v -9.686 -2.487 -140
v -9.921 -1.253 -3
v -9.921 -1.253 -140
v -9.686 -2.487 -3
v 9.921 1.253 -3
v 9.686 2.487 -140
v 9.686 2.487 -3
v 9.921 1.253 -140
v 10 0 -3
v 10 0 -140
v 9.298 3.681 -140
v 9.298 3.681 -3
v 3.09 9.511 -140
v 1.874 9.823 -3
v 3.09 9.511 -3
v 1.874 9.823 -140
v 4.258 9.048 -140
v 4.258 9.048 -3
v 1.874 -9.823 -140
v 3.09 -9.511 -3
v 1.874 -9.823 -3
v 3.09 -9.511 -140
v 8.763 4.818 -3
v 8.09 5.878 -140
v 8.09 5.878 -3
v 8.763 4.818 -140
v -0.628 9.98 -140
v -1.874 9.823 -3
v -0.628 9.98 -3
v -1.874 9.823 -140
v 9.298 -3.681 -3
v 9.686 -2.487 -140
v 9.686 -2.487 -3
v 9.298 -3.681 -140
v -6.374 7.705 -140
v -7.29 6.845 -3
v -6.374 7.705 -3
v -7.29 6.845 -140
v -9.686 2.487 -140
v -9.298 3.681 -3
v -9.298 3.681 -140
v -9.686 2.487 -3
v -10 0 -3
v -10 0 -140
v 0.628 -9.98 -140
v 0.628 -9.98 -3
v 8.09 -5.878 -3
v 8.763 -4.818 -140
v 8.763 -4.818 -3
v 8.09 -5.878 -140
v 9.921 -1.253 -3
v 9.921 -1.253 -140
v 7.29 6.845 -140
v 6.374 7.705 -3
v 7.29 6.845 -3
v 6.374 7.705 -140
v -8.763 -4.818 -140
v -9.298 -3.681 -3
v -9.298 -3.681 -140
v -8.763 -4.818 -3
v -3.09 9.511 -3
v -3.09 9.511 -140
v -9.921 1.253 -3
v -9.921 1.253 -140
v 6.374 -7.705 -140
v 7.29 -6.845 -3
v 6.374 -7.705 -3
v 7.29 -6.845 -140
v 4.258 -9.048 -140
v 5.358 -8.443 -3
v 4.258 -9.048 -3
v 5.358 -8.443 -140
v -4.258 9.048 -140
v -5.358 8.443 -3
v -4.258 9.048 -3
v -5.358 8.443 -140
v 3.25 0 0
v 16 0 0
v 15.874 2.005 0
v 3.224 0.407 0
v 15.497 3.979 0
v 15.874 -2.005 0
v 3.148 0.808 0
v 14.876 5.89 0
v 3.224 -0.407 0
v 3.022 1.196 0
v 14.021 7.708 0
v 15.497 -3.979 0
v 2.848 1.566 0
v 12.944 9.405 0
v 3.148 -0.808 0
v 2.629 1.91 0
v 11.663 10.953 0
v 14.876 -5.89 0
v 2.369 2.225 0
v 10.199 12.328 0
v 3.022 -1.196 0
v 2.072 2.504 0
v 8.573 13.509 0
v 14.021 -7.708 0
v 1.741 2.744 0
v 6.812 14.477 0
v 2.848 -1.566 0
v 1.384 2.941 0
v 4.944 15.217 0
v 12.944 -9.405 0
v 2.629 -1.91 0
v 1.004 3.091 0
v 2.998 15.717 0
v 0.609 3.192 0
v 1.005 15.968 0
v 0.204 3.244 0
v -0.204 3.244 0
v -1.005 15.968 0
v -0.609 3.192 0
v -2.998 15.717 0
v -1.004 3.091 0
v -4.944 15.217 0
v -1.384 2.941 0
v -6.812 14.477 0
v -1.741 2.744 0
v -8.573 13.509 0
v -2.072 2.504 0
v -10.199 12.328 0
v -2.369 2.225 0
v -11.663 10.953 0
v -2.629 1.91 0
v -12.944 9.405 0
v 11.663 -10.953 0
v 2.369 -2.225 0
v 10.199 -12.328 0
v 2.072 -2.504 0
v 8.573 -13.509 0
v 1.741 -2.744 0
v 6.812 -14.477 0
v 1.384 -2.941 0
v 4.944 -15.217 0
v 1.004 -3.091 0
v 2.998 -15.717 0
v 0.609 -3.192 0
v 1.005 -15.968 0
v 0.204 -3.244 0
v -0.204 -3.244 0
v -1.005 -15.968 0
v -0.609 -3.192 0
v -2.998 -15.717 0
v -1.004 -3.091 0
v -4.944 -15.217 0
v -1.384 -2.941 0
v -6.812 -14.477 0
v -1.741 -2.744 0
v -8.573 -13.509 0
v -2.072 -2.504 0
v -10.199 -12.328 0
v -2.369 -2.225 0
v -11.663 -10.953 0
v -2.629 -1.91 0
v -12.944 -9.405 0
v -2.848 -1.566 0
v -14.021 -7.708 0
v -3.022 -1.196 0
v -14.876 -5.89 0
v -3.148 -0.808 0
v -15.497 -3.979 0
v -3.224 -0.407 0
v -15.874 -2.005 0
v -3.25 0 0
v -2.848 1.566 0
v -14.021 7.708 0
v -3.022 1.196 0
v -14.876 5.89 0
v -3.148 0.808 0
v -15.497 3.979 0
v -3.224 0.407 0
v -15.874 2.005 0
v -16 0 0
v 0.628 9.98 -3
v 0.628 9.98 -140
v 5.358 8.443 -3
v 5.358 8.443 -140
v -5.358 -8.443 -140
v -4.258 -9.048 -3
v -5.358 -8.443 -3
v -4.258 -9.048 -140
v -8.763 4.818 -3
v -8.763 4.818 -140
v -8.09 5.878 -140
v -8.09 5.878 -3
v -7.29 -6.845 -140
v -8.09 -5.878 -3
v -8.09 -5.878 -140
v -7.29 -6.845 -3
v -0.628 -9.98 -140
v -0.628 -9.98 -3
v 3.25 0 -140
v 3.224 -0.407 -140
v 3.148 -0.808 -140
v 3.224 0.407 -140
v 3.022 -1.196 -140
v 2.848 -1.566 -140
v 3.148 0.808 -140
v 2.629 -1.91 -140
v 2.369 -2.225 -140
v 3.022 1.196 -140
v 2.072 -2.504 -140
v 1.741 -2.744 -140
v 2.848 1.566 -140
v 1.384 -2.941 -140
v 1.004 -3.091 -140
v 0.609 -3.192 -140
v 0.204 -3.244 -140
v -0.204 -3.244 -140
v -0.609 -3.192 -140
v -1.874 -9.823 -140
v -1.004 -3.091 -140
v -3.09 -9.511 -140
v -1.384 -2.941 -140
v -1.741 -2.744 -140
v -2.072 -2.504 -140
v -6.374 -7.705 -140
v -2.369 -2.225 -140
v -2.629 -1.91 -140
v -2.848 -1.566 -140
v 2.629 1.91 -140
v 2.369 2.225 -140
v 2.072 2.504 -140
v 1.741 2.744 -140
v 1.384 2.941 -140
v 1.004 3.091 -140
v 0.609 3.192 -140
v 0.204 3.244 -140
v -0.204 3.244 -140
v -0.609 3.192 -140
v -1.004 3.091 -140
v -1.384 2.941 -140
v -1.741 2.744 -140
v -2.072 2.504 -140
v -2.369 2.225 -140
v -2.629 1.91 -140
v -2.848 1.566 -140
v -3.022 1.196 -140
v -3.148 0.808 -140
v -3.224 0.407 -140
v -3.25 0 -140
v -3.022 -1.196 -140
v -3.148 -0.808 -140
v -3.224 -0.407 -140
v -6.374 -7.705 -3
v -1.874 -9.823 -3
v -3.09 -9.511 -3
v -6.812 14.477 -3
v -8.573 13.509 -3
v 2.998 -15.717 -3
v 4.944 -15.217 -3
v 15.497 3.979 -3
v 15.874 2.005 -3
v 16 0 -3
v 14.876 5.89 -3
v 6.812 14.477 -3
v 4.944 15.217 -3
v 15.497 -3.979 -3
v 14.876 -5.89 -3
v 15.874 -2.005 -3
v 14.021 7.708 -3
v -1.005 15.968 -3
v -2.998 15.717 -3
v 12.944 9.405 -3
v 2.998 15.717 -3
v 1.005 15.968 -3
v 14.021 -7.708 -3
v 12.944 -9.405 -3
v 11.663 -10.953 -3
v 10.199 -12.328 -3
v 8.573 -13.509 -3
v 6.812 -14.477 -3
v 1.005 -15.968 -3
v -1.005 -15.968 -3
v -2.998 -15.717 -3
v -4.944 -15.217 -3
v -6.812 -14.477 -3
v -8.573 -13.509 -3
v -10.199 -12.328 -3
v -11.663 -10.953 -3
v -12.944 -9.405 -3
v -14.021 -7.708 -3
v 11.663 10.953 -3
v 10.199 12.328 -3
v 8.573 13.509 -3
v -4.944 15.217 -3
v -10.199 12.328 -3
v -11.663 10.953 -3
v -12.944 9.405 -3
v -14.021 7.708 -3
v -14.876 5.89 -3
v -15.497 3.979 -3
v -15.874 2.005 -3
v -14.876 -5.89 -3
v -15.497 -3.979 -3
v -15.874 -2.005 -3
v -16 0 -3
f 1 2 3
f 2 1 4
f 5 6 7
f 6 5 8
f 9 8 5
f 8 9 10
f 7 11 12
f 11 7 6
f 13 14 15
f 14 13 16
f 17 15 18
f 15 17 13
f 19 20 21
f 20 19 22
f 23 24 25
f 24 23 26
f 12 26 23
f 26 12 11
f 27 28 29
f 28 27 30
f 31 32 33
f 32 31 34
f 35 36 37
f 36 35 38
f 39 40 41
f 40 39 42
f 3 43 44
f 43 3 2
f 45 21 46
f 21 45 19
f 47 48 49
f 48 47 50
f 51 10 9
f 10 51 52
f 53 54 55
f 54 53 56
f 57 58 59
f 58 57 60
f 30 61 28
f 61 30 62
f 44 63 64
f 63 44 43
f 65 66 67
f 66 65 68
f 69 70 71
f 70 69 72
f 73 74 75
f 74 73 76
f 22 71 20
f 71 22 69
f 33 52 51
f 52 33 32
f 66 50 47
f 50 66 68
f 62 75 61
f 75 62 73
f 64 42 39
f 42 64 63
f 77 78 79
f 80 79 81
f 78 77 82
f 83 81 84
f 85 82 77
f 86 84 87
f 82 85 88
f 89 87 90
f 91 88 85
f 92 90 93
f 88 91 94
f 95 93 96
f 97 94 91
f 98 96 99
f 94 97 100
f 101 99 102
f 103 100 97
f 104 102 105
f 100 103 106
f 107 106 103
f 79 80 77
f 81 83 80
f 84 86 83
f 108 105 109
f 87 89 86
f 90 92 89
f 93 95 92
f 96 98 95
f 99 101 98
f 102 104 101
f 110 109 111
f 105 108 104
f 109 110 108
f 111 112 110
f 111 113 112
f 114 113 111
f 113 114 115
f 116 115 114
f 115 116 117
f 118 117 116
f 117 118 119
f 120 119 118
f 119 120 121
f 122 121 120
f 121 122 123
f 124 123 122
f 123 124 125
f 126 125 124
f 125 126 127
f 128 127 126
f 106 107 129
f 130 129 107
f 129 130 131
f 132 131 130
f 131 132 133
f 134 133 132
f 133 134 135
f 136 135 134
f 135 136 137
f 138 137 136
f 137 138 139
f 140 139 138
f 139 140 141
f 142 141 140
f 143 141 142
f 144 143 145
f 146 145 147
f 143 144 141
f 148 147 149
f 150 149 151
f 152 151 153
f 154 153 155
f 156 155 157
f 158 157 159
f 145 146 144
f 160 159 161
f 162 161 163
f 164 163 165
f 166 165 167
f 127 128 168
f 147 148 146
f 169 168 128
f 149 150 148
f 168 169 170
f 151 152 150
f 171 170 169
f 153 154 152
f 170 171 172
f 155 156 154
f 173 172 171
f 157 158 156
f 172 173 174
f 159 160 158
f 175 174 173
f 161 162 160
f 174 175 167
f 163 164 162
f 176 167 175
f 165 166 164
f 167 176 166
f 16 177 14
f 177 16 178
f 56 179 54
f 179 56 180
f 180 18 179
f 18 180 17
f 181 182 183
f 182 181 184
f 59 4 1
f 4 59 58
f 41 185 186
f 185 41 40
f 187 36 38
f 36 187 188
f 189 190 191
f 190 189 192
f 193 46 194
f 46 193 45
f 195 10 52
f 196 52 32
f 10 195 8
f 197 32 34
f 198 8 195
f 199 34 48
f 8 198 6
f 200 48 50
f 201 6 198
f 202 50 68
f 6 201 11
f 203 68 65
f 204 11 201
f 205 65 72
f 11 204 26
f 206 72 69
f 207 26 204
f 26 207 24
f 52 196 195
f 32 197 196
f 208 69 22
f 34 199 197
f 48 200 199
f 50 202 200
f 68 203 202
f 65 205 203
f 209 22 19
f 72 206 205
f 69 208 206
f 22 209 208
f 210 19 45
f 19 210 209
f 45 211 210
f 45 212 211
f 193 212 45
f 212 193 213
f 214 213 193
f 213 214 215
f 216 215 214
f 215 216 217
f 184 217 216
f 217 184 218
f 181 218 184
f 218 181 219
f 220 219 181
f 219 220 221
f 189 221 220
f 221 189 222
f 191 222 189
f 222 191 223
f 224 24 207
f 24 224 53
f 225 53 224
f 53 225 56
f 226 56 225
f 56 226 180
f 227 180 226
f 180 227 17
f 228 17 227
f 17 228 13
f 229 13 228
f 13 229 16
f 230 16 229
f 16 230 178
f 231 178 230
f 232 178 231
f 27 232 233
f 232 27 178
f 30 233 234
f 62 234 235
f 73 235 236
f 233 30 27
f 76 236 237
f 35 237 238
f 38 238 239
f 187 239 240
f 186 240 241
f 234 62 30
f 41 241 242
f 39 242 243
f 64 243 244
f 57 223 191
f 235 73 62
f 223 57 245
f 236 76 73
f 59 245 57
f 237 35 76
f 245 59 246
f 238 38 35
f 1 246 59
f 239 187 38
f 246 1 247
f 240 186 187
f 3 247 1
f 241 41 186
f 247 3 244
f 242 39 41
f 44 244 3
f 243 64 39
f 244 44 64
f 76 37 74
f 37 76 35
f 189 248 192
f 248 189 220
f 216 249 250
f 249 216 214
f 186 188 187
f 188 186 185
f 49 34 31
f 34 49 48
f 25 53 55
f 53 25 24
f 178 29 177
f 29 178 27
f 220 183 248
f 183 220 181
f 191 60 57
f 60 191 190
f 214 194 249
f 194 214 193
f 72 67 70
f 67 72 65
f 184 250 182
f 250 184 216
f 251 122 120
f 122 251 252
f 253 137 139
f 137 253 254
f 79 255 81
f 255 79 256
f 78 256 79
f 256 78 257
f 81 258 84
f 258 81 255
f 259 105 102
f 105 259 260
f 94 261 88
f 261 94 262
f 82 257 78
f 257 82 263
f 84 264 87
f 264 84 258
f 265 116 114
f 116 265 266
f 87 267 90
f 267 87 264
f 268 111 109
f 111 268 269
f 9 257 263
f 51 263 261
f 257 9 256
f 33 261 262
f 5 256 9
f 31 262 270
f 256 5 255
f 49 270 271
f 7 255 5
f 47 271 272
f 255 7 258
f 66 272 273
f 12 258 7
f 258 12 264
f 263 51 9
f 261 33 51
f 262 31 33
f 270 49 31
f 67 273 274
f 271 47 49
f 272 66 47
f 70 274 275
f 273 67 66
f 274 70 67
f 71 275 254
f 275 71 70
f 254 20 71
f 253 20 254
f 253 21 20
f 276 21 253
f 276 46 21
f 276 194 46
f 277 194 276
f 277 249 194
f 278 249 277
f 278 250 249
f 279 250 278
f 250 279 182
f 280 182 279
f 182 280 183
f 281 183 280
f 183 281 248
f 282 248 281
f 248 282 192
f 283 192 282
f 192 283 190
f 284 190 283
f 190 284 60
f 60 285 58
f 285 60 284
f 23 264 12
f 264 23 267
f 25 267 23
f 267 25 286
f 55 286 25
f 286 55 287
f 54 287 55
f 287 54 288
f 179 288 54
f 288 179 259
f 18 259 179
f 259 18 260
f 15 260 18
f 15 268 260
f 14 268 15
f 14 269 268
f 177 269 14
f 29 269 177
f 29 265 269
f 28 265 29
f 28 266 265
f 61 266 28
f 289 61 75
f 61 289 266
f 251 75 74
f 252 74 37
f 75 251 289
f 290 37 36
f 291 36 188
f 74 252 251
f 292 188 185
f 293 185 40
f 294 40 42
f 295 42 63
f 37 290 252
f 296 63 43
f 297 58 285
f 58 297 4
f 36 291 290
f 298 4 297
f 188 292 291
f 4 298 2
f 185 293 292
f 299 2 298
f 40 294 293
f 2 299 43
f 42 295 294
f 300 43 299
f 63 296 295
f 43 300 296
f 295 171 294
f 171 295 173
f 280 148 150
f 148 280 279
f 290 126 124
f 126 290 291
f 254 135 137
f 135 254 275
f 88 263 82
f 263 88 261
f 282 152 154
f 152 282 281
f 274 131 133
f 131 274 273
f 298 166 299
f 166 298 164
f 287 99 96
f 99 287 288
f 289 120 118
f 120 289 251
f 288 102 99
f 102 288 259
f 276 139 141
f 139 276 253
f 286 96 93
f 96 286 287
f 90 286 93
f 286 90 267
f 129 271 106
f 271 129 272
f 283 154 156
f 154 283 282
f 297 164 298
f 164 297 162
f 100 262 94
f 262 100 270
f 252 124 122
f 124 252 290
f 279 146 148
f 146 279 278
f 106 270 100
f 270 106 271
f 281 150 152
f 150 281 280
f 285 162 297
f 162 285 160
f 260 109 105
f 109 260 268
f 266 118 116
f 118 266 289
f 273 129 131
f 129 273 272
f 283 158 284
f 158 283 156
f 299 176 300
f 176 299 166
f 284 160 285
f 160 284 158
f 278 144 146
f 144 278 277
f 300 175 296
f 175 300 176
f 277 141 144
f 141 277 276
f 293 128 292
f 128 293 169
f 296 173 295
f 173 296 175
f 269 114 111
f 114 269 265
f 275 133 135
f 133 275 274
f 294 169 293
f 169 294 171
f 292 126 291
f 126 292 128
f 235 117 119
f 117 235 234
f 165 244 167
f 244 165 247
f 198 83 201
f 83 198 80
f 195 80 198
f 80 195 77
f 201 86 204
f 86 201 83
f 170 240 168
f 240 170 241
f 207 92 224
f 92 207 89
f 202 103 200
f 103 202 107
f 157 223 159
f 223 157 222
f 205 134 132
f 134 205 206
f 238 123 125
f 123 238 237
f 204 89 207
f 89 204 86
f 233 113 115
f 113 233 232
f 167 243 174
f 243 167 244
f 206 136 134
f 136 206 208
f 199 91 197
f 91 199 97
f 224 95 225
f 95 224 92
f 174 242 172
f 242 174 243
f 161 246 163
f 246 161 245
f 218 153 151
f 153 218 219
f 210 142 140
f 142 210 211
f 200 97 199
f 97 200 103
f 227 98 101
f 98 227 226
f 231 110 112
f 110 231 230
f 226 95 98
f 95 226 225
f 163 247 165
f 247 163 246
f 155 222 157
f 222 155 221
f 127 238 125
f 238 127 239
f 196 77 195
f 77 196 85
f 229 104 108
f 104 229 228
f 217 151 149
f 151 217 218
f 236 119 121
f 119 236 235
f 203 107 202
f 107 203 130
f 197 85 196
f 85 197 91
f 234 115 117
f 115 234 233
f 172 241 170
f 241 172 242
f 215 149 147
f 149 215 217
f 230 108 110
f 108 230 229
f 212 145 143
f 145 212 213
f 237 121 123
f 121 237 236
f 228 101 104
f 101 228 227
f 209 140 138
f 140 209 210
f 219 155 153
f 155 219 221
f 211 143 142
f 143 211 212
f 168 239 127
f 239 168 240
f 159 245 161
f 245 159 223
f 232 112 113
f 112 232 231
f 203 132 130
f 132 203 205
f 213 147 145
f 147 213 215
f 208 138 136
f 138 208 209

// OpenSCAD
$fn = 50;


difference() {
	union() {
		translate(v = [0, 0, -140.0000000000]) {
			cylinder(h = 140, r = 10.0000000000);
		}
		translate(v = [0, 0, -3.0000000000]) {
			cylinder(h = 3, r = 16.0000000000);
		}
	}
	union() {
		#translate(v = [0, 0, -140]) {
			cylinder(h = 140, r = 3.2500000000);
		}
	}
}
